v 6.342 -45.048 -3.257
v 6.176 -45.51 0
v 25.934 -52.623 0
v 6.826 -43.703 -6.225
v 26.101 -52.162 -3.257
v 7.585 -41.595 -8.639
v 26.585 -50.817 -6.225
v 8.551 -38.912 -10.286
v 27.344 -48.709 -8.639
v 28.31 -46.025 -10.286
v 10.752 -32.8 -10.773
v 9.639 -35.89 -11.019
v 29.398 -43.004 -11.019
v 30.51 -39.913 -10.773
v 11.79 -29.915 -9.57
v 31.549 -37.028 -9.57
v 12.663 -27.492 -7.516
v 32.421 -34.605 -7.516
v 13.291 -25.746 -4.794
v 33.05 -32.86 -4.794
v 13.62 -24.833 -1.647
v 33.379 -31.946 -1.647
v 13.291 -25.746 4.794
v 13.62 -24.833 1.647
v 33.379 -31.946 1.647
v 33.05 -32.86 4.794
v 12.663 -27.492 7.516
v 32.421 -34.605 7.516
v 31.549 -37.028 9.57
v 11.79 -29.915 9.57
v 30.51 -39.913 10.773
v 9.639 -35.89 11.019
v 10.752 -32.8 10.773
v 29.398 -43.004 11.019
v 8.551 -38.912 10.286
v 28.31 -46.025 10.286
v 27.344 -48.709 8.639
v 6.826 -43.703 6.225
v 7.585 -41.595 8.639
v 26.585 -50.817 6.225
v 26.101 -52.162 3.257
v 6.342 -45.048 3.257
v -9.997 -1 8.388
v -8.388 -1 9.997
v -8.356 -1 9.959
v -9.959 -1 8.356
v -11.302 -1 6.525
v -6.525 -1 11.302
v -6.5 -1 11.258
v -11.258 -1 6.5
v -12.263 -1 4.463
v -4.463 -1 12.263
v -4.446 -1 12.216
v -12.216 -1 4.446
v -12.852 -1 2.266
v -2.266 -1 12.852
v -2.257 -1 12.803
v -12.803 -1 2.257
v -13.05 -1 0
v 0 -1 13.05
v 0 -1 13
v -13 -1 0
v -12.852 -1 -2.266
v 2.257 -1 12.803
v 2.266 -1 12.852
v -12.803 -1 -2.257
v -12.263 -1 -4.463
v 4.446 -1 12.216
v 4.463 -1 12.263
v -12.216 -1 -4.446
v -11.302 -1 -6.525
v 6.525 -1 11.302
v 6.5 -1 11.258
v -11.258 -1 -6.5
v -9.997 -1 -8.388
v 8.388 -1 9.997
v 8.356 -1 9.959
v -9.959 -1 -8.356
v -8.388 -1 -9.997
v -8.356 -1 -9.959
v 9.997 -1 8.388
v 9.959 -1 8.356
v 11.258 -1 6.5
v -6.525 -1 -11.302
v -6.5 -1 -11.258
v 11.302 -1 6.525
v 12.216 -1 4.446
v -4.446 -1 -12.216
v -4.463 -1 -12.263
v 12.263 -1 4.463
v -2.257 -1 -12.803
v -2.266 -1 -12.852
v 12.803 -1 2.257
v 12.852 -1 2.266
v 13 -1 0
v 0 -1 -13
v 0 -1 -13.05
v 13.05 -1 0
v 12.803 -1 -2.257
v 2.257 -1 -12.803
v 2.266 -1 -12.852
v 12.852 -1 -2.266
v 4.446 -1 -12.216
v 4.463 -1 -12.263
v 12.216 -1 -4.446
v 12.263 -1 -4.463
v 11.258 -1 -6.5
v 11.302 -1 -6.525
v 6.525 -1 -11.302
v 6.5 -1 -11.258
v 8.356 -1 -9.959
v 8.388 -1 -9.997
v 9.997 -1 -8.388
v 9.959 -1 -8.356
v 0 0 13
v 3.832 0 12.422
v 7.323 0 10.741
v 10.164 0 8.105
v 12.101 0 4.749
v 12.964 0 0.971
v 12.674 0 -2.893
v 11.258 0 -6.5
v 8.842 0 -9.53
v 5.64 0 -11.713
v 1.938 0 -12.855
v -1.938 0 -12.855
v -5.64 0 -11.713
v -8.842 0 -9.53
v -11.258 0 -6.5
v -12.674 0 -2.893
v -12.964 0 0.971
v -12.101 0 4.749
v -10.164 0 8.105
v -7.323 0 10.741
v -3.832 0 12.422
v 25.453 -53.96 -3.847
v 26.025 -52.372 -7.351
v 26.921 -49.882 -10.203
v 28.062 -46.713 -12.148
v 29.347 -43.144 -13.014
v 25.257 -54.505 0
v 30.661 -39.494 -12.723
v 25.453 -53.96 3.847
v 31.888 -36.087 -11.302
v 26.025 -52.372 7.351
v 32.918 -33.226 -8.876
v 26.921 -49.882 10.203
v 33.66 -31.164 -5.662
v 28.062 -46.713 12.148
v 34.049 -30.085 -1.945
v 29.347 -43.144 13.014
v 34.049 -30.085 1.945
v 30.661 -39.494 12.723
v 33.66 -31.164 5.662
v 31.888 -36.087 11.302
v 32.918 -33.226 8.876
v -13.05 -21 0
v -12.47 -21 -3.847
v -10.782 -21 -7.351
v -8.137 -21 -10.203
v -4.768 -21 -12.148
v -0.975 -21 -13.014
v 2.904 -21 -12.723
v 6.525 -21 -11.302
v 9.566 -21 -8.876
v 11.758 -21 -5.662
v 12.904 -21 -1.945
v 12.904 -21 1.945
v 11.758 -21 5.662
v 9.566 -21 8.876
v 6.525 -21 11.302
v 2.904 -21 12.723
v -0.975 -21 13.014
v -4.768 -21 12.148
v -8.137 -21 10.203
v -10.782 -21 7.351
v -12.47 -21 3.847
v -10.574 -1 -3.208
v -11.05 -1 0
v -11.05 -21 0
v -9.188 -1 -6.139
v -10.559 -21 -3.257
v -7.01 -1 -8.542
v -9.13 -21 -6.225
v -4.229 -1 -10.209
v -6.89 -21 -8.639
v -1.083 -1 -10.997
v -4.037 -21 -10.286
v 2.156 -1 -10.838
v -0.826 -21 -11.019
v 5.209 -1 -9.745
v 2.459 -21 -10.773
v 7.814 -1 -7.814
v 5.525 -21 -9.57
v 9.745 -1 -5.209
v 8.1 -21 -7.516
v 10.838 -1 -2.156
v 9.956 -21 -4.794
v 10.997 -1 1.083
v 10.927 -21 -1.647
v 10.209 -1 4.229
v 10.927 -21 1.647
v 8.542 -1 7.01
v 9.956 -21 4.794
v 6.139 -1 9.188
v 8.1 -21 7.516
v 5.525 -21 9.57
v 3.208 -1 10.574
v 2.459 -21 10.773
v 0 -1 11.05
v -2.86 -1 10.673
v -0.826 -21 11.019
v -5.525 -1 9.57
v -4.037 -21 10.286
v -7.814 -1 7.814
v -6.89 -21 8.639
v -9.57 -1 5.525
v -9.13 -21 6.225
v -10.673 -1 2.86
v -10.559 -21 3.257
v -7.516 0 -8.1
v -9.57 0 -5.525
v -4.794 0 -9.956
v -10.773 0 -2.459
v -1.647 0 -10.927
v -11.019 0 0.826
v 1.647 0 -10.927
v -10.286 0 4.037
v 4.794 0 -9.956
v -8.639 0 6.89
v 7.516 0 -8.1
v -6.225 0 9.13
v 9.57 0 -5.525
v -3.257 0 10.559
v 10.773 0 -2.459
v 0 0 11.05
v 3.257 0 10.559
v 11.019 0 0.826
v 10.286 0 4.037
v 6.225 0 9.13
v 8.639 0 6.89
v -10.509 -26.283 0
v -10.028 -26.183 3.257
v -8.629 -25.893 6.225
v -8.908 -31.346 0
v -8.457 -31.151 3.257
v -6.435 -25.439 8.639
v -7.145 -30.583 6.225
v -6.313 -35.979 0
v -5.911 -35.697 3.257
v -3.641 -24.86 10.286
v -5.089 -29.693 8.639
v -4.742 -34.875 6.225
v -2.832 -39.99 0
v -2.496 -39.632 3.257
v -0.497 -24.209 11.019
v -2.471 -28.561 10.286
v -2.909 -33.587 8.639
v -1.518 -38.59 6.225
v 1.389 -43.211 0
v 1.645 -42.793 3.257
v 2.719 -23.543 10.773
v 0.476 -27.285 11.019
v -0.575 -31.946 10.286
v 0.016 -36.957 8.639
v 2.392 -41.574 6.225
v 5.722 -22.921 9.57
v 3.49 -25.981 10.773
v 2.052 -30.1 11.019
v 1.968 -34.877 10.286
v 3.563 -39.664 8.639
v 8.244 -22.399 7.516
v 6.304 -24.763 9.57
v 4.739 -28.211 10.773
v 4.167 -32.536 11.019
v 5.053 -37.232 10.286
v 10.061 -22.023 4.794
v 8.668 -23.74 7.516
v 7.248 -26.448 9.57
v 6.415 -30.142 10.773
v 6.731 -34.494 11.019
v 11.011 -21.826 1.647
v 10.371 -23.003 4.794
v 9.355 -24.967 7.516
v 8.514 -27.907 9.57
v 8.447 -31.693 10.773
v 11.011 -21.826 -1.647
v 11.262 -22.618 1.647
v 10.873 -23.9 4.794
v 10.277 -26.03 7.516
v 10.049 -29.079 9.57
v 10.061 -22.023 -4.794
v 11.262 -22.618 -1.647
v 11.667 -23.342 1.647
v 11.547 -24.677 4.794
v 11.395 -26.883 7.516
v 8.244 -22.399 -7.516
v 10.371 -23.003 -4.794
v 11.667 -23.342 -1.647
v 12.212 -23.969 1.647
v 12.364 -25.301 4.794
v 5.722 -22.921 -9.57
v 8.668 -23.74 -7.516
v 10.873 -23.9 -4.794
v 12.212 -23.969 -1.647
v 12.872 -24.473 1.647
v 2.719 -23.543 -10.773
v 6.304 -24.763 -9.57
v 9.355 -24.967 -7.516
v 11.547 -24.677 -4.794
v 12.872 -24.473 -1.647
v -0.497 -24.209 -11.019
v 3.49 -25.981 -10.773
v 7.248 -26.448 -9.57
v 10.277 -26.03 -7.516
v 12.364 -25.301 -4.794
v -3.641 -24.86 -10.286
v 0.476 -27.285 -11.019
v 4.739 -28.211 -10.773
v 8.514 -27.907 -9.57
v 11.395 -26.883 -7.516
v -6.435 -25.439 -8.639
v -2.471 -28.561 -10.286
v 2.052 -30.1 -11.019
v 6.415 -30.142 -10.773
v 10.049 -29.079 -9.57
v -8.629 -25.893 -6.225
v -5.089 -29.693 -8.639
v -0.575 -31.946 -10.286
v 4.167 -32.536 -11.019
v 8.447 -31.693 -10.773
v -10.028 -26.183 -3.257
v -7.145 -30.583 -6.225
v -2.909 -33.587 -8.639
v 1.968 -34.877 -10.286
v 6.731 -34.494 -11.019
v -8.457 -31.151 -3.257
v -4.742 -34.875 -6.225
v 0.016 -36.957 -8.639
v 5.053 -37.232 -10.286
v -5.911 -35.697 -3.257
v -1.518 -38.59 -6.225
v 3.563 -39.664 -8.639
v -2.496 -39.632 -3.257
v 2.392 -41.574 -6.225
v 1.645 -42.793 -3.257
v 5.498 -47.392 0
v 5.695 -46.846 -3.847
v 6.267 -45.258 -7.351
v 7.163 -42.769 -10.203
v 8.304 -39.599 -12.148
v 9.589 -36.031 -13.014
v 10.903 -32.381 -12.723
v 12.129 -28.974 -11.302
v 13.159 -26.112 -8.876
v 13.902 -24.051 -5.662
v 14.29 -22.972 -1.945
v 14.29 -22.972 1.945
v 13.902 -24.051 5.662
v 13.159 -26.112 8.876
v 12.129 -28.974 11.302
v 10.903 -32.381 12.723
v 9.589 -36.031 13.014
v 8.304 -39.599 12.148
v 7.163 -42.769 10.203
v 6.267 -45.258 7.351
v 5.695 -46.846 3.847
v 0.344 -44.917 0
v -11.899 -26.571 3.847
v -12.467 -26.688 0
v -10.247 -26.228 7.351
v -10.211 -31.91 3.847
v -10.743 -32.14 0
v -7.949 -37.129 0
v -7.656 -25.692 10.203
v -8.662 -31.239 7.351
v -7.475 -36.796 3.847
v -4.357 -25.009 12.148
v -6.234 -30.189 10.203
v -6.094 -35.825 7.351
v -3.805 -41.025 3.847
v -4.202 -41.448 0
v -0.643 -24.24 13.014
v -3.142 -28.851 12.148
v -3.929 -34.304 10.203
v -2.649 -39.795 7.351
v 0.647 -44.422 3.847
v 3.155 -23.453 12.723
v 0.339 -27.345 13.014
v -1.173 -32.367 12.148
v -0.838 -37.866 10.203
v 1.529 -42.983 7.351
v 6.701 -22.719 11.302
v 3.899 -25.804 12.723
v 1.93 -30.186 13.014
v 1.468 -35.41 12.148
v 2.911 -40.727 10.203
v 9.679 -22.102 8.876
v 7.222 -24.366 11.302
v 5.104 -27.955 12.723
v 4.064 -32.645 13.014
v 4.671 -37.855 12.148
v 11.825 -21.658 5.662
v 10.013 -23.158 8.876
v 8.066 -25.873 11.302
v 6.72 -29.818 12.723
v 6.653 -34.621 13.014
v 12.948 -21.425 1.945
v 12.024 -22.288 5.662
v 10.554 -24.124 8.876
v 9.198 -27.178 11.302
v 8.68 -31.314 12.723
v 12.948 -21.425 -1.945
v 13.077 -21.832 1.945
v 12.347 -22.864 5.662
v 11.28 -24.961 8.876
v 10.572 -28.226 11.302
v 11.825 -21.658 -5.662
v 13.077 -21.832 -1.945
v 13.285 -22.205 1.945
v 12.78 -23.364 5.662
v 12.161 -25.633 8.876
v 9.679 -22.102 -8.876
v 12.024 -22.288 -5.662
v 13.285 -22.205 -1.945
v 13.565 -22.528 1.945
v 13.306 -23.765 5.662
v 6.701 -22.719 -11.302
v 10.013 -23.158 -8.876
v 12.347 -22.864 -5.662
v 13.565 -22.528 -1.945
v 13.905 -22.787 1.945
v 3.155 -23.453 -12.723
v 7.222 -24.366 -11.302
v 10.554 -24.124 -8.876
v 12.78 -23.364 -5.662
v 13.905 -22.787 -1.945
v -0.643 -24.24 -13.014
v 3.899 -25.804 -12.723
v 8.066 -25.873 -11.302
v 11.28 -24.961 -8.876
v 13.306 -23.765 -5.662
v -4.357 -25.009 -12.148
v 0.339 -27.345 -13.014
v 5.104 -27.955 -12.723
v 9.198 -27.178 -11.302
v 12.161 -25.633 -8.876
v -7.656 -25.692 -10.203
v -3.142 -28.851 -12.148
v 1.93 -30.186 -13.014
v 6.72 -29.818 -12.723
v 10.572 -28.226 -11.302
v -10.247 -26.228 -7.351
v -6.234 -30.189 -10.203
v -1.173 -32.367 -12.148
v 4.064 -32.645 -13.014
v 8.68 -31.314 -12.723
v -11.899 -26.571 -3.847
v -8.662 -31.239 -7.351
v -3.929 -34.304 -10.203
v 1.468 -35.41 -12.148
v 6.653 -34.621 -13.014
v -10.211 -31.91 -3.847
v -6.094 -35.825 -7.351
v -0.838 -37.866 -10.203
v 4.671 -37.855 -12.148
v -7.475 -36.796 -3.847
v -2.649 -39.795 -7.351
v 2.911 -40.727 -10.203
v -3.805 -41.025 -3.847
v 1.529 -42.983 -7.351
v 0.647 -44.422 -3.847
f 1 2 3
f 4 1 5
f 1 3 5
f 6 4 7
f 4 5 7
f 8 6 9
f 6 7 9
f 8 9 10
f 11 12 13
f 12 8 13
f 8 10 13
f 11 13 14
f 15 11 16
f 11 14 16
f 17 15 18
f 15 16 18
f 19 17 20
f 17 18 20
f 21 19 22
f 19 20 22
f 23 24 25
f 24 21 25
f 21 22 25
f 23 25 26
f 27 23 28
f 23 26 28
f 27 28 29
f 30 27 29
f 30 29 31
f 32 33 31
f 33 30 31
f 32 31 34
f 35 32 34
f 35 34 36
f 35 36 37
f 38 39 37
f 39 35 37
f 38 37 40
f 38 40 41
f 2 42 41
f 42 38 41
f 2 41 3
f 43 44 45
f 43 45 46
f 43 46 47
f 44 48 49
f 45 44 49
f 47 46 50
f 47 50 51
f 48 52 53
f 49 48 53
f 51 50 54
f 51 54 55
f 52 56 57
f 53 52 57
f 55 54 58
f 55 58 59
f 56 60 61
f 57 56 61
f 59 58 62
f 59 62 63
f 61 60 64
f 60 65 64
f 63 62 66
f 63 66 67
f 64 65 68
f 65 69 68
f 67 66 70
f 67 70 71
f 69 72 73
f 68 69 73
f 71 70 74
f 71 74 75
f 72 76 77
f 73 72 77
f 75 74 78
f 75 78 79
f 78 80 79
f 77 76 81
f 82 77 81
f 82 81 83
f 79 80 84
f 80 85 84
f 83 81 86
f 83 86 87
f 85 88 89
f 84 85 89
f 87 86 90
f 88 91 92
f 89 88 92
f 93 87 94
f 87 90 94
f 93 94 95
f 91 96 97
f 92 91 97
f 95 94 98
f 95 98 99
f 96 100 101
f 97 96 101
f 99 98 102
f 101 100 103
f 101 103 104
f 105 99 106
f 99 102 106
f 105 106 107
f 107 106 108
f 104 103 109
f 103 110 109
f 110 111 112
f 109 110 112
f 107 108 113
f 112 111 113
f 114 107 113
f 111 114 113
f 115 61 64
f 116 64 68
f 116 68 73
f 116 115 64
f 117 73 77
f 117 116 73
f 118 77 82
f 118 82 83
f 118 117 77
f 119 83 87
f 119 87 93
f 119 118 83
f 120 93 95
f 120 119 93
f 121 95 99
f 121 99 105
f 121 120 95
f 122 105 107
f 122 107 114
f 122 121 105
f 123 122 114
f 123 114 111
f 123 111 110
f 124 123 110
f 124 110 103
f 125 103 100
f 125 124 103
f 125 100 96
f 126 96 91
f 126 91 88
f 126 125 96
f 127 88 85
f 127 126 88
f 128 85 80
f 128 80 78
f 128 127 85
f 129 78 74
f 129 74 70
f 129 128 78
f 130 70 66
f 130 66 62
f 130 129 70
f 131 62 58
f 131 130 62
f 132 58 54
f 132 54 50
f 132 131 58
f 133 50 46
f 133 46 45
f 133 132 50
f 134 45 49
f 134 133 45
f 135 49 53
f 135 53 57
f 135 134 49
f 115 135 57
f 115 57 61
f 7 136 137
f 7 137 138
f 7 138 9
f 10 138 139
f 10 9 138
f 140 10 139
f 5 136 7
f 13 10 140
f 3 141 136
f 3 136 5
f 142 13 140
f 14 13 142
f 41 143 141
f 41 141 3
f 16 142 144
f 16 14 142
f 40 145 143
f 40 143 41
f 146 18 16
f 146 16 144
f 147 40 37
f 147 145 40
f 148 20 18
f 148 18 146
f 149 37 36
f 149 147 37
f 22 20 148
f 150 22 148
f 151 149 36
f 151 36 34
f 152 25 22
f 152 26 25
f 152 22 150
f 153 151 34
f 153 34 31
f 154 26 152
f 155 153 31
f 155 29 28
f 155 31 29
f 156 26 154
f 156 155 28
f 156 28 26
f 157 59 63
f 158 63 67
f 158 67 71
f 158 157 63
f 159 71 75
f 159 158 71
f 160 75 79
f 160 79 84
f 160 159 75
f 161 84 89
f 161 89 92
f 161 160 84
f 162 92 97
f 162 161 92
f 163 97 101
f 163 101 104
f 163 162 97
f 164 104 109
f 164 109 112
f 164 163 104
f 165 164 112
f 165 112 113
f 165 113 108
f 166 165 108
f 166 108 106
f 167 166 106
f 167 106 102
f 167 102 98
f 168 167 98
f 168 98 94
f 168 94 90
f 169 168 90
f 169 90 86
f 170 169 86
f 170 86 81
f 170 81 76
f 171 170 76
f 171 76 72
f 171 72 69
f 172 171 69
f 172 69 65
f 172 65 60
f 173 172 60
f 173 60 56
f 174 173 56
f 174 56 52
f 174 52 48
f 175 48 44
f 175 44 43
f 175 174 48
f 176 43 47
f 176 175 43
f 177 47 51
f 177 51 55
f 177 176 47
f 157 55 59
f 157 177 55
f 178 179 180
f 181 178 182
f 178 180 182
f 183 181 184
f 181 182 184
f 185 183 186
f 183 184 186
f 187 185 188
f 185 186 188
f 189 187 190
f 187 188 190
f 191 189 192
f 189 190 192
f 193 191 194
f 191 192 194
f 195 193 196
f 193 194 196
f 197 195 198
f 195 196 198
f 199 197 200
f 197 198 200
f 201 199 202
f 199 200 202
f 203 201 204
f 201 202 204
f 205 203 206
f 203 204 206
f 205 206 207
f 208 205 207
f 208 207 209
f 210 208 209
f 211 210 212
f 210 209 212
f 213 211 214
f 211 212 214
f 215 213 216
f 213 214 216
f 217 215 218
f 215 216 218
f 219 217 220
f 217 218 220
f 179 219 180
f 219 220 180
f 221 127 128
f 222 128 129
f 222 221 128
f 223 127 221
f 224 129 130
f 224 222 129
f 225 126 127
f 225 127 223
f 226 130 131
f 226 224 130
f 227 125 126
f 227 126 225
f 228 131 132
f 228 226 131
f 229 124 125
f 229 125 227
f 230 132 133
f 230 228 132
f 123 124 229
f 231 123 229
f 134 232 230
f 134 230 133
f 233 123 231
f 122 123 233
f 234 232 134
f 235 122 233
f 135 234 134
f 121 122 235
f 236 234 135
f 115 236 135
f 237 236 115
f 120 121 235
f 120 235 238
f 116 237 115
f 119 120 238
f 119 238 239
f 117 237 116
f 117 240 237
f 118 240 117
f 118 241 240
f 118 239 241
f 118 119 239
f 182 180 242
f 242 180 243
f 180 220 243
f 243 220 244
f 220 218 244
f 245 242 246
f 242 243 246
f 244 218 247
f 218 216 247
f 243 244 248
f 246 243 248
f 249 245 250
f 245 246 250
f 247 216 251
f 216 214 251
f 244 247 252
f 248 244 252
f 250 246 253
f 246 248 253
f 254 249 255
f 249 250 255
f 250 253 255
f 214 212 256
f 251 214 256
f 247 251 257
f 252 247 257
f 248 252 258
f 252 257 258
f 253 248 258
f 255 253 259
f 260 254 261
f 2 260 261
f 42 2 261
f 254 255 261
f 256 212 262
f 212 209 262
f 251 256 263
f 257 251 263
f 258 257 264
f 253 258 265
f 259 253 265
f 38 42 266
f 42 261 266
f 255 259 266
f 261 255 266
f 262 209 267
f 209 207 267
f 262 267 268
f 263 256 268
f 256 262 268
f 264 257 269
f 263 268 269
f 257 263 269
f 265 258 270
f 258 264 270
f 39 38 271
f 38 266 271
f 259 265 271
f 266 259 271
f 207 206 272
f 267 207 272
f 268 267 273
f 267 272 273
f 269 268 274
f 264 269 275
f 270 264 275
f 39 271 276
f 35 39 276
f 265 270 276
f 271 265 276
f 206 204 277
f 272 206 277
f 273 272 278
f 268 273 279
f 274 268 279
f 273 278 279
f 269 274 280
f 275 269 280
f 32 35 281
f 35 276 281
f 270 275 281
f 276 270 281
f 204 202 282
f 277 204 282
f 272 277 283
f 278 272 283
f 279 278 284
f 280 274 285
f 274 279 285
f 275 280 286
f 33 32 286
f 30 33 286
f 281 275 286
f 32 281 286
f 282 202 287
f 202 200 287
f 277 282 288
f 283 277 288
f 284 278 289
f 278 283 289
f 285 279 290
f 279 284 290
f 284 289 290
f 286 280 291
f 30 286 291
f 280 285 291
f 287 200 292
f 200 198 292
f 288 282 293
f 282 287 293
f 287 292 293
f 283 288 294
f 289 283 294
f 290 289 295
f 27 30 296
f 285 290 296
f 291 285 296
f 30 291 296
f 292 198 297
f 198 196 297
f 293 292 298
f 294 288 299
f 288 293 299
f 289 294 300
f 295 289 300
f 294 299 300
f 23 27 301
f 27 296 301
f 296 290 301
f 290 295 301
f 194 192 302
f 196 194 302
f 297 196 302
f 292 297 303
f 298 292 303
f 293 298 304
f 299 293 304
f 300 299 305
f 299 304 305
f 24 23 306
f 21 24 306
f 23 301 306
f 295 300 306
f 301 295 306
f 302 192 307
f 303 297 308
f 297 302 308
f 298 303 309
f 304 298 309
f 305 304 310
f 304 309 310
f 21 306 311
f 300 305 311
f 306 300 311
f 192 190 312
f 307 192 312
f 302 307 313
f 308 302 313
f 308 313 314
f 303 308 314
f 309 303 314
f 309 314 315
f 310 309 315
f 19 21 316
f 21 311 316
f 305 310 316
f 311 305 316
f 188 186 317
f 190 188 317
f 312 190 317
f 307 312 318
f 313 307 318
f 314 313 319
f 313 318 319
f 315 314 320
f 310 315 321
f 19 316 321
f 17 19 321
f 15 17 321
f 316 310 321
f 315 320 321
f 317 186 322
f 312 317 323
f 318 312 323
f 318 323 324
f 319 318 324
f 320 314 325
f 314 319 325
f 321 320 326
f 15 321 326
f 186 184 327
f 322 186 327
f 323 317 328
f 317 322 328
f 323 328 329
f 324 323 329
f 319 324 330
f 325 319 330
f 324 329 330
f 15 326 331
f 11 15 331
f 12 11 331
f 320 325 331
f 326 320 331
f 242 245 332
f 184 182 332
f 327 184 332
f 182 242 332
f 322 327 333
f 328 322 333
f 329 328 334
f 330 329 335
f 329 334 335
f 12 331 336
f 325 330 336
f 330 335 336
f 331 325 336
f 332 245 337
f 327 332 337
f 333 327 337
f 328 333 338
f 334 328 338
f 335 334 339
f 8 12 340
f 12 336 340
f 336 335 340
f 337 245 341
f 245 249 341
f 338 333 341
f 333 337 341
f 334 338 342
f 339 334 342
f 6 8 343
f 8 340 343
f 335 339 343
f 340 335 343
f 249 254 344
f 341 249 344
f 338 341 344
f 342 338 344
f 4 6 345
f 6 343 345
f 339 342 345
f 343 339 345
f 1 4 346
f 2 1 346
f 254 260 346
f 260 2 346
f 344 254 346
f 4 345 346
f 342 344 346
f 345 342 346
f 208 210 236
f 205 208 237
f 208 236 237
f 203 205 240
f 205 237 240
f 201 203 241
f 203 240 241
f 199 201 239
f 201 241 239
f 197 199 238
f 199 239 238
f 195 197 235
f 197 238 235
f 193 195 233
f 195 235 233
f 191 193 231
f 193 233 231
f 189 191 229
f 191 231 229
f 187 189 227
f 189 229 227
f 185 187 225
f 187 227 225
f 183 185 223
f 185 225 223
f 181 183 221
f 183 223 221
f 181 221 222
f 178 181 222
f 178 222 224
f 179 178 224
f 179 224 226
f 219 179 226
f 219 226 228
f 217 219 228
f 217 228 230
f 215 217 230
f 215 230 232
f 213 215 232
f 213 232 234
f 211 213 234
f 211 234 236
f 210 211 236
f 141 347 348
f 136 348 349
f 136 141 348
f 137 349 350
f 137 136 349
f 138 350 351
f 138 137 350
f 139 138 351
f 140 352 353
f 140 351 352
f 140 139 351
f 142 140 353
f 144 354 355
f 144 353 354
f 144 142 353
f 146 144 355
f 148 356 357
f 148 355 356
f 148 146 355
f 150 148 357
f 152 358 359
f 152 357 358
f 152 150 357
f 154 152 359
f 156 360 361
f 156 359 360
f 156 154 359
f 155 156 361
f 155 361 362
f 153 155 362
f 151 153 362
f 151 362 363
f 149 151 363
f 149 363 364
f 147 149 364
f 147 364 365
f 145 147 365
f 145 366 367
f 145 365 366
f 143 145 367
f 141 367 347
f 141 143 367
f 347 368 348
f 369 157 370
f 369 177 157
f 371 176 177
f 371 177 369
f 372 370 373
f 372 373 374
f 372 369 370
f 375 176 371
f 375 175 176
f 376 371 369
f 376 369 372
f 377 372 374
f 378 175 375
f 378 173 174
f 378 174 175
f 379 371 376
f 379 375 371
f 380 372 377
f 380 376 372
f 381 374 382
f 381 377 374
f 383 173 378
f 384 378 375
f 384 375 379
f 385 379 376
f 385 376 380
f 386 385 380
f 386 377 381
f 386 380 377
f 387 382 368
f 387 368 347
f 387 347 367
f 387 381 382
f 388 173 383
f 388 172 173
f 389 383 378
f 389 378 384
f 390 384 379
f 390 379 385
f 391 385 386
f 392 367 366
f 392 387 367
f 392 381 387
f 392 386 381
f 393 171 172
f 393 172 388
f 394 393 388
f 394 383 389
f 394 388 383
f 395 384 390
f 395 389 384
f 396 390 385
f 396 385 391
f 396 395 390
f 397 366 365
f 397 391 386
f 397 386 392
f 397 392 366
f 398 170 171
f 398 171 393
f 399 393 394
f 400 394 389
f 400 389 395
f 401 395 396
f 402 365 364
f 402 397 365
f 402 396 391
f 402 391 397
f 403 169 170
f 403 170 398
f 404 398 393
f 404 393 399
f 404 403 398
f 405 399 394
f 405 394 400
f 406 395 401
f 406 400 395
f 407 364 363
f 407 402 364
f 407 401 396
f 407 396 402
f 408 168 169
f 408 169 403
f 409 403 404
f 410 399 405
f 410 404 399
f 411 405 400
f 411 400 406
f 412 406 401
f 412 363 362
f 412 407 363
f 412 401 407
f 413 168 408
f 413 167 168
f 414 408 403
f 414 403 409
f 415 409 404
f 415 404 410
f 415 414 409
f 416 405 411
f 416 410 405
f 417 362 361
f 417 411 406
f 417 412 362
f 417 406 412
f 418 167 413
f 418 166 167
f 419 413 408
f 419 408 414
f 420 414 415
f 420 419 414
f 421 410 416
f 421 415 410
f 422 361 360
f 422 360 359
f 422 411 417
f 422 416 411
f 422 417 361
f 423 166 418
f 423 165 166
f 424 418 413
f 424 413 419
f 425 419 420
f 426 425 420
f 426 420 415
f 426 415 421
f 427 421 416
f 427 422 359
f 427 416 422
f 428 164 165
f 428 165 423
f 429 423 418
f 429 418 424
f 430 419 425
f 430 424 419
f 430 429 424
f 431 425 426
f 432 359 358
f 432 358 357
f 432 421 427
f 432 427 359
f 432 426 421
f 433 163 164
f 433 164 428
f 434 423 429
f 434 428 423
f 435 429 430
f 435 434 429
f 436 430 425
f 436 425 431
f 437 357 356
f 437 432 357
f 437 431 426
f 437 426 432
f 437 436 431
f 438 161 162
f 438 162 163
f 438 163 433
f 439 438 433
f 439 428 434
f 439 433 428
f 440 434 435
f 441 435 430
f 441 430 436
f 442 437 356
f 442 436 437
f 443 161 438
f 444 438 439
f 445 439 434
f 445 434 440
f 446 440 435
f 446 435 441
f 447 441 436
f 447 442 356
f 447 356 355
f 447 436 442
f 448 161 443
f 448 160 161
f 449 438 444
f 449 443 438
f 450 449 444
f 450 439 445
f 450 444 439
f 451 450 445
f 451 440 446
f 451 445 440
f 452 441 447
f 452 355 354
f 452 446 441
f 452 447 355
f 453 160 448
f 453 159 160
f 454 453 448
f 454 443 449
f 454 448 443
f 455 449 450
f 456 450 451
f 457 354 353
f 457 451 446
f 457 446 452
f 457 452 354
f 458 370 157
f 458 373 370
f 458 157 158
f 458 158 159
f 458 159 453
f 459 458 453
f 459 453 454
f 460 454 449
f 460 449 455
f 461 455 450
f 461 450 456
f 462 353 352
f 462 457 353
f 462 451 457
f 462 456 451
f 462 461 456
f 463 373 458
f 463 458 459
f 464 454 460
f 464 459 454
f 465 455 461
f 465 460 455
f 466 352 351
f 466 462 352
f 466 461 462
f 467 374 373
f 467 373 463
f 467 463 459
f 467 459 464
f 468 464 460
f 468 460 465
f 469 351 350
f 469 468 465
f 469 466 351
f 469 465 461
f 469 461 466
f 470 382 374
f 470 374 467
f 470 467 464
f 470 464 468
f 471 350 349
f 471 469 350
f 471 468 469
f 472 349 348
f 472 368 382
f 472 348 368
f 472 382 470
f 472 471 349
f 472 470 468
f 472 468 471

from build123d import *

# Parameters (mm, degrees)
CROQUIS1_R                 = 13
CROQUIS1_R_2               = 11.05
SALIENTE_EXTRUIR1_DEPTH    = 1
BARRER_L_MINA1_PROFILE_R   = 13.05
BARRER_L_MINA1_PROFILE_R_2 = 11.05


with BuildPart() as part:
    # Croquis1 → Saliente-Extruir1 (new body)
    with BuildSketch(Plane(origin=(0, 0, 0), x_dir=(1, 0, 0), z_dir=(0, 1, 0))):
        with Locations(Location((0, 0, 0), (0, 0, 270))):
            Circle(CROQUIS1_R)
        with Locations(Location((0, 0, 0), (0, 0, 270))):
            Circle(CROQUIS1_R_2, mode=Mode.SUBTRACT)
    extrude(amount=-SALIENTE_EXTRUIR1_DEPTH)

    # Barrer-L_mina1: sweep along a path in Croquis2
    with BuildLine(Plane.XY) as barrer_l_mina1_path:
        Line((0, -1), (0, -21))
        ThreePointArc((0, -21), (2.727754239, -29.625078781), (9.918931196, -35.113211534))
        Line((9.918931196, -35.113211534), (29.677427344, -42.226707859))
    # Barrer-L_mina1 profile (on start of the path) → Barrer-L_mina1 (sweep)
    with BuildSketch(Plane(origin=(0, -1, 0), x_dir=(-1, 0, 0), z_dir=(0, -1, 0))):
        Circle(BARRER_L_MINA1_PROFILE_R)
        Circle(BARRER_L_MINA1_PROFILE_R_2, mode=Mode.SUBTRACT)
    sweep(path=barrer_l_mina1_path.line)


solid = part.part
